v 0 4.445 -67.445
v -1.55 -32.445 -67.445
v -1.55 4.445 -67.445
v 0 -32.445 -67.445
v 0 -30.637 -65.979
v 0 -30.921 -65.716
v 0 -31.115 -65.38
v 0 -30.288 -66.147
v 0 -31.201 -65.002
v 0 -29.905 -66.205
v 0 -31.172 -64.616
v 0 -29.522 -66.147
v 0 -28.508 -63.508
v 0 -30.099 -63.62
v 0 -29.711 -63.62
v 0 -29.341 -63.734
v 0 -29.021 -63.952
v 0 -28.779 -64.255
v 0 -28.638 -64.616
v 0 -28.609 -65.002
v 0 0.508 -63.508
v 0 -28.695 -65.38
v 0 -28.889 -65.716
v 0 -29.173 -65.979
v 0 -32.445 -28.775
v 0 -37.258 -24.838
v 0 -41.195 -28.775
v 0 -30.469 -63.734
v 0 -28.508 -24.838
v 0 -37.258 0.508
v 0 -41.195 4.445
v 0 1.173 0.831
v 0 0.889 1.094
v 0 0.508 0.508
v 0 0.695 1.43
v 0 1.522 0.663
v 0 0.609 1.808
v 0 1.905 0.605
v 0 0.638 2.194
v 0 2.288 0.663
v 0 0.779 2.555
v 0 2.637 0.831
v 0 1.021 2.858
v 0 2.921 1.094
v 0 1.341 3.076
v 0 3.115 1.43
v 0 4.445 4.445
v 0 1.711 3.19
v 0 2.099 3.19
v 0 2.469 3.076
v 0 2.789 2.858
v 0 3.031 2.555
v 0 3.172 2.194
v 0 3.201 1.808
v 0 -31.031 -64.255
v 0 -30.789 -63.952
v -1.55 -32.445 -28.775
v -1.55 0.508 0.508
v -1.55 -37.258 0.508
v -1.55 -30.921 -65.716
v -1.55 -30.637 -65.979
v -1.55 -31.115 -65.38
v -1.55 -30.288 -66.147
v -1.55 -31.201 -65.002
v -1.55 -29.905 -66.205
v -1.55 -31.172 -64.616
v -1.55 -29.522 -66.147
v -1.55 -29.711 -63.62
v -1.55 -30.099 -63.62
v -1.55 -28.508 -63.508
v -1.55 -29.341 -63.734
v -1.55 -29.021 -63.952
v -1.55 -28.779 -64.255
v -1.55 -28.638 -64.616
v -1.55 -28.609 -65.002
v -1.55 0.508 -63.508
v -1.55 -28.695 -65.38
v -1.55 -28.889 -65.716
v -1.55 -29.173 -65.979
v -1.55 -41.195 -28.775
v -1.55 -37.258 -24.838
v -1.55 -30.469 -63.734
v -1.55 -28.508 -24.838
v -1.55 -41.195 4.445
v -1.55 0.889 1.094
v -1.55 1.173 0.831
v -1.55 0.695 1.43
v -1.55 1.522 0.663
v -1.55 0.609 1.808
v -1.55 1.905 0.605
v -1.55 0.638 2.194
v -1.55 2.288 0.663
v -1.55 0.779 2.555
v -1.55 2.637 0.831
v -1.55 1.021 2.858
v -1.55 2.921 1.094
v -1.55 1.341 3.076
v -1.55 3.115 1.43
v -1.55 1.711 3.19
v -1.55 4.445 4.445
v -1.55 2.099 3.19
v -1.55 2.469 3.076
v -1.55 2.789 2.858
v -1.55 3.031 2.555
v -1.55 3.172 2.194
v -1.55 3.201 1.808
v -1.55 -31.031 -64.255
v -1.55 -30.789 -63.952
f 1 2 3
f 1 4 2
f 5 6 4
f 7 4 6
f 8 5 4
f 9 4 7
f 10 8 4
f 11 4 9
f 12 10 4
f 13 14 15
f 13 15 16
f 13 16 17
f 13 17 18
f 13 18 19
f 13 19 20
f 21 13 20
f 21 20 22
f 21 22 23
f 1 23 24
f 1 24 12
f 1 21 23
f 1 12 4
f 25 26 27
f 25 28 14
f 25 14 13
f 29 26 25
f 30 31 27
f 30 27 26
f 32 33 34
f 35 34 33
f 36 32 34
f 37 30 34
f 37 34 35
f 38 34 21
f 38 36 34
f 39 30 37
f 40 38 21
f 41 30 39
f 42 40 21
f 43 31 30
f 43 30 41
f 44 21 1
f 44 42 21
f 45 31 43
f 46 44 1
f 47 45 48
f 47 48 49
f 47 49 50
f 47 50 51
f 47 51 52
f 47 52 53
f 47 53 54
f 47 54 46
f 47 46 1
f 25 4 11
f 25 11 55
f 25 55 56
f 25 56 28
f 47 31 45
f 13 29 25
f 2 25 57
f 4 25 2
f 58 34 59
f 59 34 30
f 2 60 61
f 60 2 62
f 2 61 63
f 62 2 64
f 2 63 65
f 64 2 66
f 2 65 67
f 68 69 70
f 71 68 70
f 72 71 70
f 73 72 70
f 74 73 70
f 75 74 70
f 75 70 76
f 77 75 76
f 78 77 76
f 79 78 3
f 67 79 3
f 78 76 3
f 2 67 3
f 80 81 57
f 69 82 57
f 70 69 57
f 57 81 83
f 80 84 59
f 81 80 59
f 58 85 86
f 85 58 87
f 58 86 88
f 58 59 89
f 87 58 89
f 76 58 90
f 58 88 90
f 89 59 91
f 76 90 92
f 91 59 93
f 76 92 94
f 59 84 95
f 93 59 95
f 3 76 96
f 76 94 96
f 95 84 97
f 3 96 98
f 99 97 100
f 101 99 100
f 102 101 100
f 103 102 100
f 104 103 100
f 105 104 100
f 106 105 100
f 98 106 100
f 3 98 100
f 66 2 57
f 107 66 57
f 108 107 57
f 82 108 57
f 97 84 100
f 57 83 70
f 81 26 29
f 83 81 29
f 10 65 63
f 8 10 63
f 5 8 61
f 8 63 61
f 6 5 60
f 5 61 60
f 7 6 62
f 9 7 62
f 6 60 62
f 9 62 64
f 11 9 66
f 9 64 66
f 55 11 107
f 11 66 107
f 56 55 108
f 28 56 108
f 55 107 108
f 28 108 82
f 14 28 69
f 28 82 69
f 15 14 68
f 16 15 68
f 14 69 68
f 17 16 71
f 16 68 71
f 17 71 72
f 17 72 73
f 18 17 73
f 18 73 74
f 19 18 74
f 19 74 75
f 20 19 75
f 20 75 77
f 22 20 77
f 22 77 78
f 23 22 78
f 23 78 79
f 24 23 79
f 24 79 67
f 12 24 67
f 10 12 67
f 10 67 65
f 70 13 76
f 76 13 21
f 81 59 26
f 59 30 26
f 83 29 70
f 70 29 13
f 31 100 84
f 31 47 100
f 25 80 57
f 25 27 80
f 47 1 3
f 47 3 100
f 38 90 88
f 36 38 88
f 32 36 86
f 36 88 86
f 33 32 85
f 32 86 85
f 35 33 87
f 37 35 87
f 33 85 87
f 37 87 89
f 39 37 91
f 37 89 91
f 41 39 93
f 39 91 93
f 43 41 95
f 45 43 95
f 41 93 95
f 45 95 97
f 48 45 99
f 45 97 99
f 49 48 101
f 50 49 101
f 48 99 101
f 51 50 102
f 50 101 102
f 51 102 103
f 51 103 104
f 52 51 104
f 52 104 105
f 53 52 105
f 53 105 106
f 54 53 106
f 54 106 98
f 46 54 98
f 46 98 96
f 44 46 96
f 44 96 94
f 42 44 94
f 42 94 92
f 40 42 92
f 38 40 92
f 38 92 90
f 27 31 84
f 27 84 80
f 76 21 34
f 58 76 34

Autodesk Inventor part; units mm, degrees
ref_plane "YZ Plane" through (0, 0, 0) normal (1, 0, 0) x (0, 1, 0)
ref_plane "XZ Plane" through (0, 0, 0) normal (0, 1, 0) x (-1, 0, 0)
ref_plane "XY Plane" through (0, 0, 0) normal (0, 0, 1) x (1, 0, 0)
sketch "Sketch1" plane through (0, 0, 0) normal (1, 0, 0) x (0, 1, 0)
  line L0 (0, 18.823) -> (0, -81.823) projected
  line L1 (-50.323, 0) -> (13.573, 0) projected
  line L2 (0, 0) -> (0, -63)
  line L3 (0, -63) -> (-28, -63)
  line L4 (-28, -63) -> (-28, -24.33)
  line L5 (-28, -24.33) -> (-36.75, -24.33)
  line L6 (-36.75, -24.33) -> (-36.75, 0)
  line L7 (-36.75, 0) -> (0, 0)
  circle A0 centre (-16, -42.5) radius 1.575 construction
  line L8 (-35.988, -0.762) -> (-35.988, -23.568)
  line L9 (-35.988, -23.568) -> (-27.238, -23.568)
  line L10 (-27.238, -23.568) -> (-27.238, -62.238)
  line L11 (-27.238, -62.238) -> (-0.762, -62.238)
  line L12 (-0.762, -62.238) -> (-0.762, -0.762)
  line L13 (-0.762, -0.762) -> (-35.988, -0.762)
  line L14 (-41.195, 4.445) -> (-41.195, -28.775)
  line L15 (-41.195, -28.775) -> (-32.445, -28.775)
  line L16 (-32.445, -28.775) -> (-32.445, -67.445)
  line L17 (-32.445, -67.445) -> (4.445, -67.445)
  line L18 (4.445, -67.445) -> (4.445, 4.445)
  line L19 (4.445, 4.445) -> (-41.195, 4.445)
  line L20 (1.905, 1.905) -> (-29.905, 1.905) construction
  line L21 (-29.905, 1.905) -> (-29.905, -64.905) construction
  line L22 (-29.905, -64.905) -> (1.905, -64.905) construction
  line L23 (1.905, -64.905) -> (1.905, 1.905) construction
  line L24 (0.508, -63.508) -> (0.508, 0.508)
  line L25 (0.508, 0.508) -> (-37.258, 0.508)
  line L26 (-37.258, 0.508) -> (-37.258, -24.838)
  line L27 (-37.258, -24.838) -> (-28.508, -24.838)
  line L28 (-28.508, -24.838) -> (-28.508, -63.508)
  line L29 (-28.508, -63.508) -> (0.508, -63.508)
  dimension "d0" = 63
  dimension "d1" = 28
  dimension "d2" = 36.75
  dimension "d3" = 24.33
  dimension "d4" = 42.5
  dimension "d5" = 16
  dimension "d6" = 3.15
  dimension "d16" = 0.762
  dimension "d17" = 4.445
  dimension "d18" = 2.54
  dimension "d19" = 2.54
  dimension "d20" = 2.54
  dimension "d21" = 2.54
  dimension "d29" = 0.508
extrude "Extrusion1" add sketch "Sketch1" against normal blind 1.55 contours L25 L26 L1 L14 L19 L0 | L0 L19 L18 L1 L24 L25 | L1 L18 L17 L0 L29 L24 | L0 L17 L16 L15 L14 L1 L26 L27 L28 L29
hole "Hole1" at (0, -16, -42.5) direction (-1, 0, 0) diameter 3.15 end through all
hole "Hole2" at (0, 1.905, 1.905) at (0, -29.905, -64.905) direction (-1, 0, 0) diameter 2.6 end through all
equation "\"d20\" = d18"
equation "\"d21\" = d18"
properties part number "J010360" material "ACRYLIC, BLACK"
